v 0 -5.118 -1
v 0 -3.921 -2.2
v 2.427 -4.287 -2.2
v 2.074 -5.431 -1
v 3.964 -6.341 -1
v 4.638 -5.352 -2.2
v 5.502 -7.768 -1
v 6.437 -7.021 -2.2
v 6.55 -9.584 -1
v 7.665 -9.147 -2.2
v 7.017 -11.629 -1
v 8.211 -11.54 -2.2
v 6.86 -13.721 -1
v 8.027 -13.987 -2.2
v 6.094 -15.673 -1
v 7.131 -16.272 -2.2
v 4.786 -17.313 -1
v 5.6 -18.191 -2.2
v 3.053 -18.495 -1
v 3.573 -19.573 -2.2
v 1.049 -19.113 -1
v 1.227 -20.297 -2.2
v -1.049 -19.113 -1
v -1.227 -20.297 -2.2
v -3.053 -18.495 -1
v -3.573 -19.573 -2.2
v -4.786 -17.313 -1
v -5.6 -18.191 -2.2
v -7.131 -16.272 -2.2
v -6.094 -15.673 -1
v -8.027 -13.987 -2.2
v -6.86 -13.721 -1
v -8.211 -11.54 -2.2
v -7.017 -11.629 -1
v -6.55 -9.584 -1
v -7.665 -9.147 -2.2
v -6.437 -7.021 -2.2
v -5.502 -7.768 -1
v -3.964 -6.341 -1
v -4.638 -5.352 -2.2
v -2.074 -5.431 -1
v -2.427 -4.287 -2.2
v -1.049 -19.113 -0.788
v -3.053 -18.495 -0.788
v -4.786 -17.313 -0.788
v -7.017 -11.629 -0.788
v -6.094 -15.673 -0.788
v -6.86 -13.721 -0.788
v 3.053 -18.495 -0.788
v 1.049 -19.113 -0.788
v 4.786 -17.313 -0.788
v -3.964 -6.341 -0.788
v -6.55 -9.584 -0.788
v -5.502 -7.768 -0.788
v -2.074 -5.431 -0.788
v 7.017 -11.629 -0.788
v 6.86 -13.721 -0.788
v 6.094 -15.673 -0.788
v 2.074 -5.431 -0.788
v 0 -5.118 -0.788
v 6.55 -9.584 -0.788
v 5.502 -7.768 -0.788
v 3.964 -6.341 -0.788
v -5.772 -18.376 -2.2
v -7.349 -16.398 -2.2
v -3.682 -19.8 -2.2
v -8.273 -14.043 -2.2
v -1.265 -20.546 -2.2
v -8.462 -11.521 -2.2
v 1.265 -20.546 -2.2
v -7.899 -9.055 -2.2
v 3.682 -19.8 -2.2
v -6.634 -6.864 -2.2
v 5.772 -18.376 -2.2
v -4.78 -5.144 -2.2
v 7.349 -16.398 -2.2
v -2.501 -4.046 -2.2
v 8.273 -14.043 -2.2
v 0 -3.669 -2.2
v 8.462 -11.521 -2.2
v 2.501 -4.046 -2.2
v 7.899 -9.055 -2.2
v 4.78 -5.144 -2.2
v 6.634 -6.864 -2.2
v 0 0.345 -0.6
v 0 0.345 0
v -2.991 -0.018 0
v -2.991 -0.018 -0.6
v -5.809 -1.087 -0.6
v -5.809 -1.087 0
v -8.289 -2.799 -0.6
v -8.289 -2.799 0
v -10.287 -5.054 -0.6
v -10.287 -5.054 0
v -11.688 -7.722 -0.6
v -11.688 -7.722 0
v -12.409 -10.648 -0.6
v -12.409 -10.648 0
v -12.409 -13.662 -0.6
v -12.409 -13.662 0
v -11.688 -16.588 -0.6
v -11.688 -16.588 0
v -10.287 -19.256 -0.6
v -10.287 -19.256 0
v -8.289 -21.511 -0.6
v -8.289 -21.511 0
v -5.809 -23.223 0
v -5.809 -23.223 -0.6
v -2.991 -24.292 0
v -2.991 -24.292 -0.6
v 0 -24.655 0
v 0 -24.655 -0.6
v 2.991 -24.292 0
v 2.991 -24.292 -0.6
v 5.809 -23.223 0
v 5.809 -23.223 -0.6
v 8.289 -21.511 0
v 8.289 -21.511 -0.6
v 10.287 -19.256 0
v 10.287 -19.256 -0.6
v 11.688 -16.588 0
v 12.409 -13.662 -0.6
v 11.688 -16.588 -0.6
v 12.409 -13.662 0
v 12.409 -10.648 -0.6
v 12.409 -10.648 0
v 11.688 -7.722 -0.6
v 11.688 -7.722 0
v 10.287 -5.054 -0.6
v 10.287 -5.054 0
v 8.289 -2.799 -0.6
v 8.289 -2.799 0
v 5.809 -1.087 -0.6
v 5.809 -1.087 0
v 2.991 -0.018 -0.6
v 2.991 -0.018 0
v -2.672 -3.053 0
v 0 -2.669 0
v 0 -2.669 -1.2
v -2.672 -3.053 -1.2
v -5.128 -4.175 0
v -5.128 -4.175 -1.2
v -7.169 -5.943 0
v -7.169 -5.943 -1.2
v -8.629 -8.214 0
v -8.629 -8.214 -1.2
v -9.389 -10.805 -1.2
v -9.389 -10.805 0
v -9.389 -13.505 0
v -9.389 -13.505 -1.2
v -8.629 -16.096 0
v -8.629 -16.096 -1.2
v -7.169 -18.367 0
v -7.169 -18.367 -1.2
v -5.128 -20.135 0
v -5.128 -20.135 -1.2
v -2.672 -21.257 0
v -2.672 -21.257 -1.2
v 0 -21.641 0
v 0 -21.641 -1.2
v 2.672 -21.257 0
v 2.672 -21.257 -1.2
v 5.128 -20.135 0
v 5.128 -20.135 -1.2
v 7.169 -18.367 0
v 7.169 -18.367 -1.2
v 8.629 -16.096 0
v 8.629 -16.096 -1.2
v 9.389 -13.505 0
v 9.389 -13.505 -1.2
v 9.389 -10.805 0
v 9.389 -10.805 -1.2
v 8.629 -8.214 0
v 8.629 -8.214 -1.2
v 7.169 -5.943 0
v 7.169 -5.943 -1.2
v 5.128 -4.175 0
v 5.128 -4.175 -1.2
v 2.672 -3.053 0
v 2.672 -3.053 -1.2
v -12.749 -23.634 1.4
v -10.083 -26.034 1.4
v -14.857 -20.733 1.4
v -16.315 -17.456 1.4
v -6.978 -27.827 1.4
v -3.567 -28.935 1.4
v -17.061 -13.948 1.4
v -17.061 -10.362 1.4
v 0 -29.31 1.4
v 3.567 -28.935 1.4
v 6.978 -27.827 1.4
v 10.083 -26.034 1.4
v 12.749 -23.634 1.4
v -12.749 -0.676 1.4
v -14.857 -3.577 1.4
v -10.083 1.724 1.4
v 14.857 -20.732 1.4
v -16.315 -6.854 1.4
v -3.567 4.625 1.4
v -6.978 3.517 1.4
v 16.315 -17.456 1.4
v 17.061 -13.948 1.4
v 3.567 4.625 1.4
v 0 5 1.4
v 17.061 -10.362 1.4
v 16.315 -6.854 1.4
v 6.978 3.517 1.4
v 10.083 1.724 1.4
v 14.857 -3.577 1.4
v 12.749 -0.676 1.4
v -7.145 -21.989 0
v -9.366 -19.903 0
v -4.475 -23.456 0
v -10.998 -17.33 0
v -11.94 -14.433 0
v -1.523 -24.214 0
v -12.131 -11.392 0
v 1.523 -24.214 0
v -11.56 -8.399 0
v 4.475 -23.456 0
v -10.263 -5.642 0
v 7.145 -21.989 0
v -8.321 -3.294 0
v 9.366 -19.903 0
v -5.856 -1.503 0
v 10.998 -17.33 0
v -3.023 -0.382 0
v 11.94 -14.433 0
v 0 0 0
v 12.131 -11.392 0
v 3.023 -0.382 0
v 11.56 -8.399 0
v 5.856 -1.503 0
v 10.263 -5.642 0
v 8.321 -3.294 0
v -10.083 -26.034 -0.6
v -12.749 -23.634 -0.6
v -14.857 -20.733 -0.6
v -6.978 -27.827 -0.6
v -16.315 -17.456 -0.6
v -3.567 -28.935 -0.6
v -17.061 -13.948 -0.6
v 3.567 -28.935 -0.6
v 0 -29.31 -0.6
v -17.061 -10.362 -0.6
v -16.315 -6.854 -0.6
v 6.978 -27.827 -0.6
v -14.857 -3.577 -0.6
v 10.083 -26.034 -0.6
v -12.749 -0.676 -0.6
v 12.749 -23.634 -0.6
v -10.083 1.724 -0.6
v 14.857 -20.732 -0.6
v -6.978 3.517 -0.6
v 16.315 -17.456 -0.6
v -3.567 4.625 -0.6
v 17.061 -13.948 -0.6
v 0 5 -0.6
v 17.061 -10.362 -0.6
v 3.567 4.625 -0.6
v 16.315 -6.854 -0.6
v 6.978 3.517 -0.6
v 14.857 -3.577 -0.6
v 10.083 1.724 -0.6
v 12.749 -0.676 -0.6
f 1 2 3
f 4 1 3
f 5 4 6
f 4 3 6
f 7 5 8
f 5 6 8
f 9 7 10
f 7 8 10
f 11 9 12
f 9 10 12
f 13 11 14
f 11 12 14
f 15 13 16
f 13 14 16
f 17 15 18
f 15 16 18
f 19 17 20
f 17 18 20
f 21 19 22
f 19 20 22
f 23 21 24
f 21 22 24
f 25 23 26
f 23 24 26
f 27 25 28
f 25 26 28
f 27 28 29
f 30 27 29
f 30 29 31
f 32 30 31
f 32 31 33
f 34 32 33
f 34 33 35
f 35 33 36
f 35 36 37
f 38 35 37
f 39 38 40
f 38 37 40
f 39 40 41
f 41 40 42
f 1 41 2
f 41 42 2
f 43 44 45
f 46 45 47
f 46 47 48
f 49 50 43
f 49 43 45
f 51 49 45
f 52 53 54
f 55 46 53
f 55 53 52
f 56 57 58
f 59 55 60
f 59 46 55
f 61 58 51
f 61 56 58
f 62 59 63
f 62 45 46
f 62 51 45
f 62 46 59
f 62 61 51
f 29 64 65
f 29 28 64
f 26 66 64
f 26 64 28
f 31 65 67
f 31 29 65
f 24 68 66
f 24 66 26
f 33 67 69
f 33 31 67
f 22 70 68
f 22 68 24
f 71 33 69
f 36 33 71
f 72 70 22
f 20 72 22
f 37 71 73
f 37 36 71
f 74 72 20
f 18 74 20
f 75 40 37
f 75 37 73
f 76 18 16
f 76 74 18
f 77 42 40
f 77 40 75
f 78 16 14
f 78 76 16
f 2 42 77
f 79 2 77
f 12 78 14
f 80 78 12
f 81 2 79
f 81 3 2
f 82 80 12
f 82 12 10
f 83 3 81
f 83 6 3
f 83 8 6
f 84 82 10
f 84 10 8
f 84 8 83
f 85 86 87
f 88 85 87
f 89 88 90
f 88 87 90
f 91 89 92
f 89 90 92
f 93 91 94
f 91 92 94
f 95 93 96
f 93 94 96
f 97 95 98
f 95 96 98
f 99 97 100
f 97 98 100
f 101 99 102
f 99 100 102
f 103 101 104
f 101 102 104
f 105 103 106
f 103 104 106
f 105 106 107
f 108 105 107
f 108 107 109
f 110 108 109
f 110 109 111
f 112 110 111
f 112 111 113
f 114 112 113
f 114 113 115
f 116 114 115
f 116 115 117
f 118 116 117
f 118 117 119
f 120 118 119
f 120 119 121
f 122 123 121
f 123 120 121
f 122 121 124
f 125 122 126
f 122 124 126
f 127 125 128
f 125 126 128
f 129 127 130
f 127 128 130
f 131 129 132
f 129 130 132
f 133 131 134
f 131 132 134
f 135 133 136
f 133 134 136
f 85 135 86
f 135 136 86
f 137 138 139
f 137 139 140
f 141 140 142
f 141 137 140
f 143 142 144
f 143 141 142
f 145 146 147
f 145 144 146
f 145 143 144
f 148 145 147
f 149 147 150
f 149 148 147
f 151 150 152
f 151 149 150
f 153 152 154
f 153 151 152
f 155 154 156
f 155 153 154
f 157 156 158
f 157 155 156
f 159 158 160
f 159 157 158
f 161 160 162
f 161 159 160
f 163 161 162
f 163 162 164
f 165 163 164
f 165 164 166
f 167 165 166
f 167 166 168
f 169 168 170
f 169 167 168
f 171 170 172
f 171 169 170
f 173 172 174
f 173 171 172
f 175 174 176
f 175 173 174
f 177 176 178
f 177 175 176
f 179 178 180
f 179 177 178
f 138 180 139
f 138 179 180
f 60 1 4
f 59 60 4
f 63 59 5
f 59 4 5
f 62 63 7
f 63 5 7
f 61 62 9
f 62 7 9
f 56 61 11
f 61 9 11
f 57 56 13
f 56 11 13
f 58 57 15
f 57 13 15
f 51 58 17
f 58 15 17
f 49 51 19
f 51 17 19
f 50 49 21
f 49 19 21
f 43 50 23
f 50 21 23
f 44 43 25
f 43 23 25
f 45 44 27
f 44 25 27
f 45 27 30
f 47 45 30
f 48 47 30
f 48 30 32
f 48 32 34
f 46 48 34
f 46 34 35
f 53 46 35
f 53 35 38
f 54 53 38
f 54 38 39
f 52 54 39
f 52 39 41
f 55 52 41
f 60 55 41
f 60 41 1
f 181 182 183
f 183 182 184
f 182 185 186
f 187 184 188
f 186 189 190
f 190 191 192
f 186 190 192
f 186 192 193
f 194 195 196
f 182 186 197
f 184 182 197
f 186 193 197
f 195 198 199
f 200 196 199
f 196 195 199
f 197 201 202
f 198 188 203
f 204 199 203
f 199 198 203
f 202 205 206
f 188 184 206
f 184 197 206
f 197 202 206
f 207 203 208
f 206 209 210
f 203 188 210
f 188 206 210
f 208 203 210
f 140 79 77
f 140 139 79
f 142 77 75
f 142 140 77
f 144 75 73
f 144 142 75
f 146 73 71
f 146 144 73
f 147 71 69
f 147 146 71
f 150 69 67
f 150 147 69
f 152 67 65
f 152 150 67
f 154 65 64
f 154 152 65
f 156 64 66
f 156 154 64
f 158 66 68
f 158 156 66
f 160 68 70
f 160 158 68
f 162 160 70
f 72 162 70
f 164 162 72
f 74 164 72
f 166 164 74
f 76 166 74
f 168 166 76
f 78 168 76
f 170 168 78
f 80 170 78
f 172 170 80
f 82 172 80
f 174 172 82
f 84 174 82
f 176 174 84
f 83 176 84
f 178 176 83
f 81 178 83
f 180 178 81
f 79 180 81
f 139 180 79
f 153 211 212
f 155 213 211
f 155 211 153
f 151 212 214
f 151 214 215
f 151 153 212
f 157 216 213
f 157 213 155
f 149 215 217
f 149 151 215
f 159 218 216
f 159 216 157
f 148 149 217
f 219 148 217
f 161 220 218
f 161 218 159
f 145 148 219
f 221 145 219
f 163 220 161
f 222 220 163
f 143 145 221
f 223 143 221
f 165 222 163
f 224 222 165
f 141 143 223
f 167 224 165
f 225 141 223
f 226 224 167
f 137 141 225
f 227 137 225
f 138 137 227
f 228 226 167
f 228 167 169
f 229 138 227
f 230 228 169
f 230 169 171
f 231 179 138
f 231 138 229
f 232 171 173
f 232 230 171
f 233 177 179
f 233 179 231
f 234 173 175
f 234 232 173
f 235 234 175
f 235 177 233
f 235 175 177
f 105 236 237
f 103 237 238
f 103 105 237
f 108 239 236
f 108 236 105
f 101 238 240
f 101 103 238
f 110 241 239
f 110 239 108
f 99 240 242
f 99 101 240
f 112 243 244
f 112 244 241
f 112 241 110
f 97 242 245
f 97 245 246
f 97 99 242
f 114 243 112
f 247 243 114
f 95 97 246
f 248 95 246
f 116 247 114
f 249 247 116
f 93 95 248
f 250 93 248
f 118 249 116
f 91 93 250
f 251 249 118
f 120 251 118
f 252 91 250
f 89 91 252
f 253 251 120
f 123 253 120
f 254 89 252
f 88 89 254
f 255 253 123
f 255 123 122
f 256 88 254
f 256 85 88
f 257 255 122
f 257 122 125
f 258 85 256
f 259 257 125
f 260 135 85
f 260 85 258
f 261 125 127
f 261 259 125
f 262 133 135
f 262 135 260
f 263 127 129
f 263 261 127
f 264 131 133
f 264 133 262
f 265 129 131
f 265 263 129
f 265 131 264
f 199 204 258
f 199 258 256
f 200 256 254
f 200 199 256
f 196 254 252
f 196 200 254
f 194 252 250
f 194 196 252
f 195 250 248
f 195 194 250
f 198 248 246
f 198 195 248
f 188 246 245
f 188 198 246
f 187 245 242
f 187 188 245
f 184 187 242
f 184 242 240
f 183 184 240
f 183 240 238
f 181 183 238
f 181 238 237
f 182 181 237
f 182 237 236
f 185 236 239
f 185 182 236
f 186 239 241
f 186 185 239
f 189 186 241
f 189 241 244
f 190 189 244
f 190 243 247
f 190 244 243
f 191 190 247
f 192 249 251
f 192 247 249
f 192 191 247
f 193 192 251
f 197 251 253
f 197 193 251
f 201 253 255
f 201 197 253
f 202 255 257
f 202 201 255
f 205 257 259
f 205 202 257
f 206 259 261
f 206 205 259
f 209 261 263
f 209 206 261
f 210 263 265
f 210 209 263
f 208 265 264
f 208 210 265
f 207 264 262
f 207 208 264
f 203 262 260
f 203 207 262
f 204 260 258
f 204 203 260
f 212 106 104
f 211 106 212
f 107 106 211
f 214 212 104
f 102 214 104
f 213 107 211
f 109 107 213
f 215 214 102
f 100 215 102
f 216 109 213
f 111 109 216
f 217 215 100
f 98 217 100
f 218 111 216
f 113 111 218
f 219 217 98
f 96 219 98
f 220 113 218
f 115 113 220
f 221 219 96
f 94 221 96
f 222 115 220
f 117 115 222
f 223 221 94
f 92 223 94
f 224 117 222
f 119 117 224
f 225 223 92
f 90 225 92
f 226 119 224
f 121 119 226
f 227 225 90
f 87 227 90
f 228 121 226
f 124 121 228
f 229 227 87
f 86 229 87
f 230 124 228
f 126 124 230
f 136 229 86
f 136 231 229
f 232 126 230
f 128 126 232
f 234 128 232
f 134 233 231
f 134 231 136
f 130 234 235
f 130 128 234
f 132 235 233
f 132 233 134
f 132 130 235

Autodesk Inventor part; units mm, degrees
ref_plane "YZ Plane" through (0, 0, 0) normal (1, 0, 0) x (0, 1, 0)
ref_plane "XZ Plane" through (0, 0, 0) normal (0, 1, 0) x (-1, 0, 0)
ref_plane "XY Plane" through (0, 0, 0) normal (0, 0, 1) x (1, 0, 0)
sketch "Skizze1" plane through (0, 0, 0) normal (1, 0, 0) x (0, 1, 0)
  line L0 (-20.6011, -1.9989) -> (-21.4, -1.2)
  line L1 (-21.4, -1.2) -> (-21.4, 0)
  line L2 (-25, 0) -> (-25, -0.6)
  line L3 (-22.8485, -0.6) -> (-20.8497, -2.5989)
  line L4 (0.345, -0.6) -> (5, -0.6)
  line L5 (5, -0.6) -> (5, 1.4)
  line L6 (-12.5, -6.6891) -> (-12.5, -2.8)
  line L7 (5, 1.4) -> (-12.155, 1.4)
  line L8 (-6.155, -0.8) -> (-6.155, -1) construction
  line L9 (-6.155, -1) -> (-18.155, -1) construction
  line L10 (-18.155, -1) -> (-18.155, -0.8) construction
  line L11 (-18.155, -0.8) -> (-13.2371, -0.918) construction
  line L12 (-12.155, 1.4) -> (-12.155, -0.7885)
  line L13 (-5.1181, -0.7885) -> (-5.1181, -1) construction
  line L14 (-5.1181, -0.7885) -> (-5.1181, -1) construction
  line L15 (-5.1181, -0.7885) -> (-5.1181, -1)
  line L16 (-6.155, -1) -> (-6.5167, -1)
  line L17 (-5.7914, -1.4086) -> (-6.1109, -1.0891)
  line L18 (-3.6, 0) -> (0, 0)
  line L19 (-5.7914, -1.4086) -> (-6.1109, -1.0891)
  line L20 (-19.1918, -1) -> (-5.1181, -1) projected
  line L21 (-5.1181, -0.7885) -> (-12.155, -0.7885)
  line L22 (-5.1181, -1) -> (-3.9212, -2.2)
  line L23 (-3.6692, -2.2) -> (-2.6692, -1.2) construction
  line L24 (-3.9212, -2.2) -> (-3.6692, -2.2)
  line L25 (-3.6692, -2.2) -> (-2.6692, -1.2)
  line L26 (-2.6692, -1.2) -> (-2.6692, 0)
  line L27 (0.345, 0) -> (0.345, -0.6) construction
  line L28 (0.345, -0.6) -> (0.345, 0)
  line L29 (0.345, 0) -> (-2.6692, 0)
  point P0 (0, -0.6)
  point P1 (-2.1515, -0.6)
  point P2 (-20.8023, -2.2)
  point P3 (-22.8485, -0.6)
  point P4 (-21.0508, -2.8)
  point P5 (-12.155, -1)
  point P6 (-5, -2.2)
  point P7 (-3.2, 0)
  dimension "d1" = 2
revolve "Umdrehung1" add sketch "Skizze1" angle 360 about axis through (0, -12.155, 1.4) along (0, 0, -1)
properties part number "50_ETL_Membrane_Mould_Lower_v0"
